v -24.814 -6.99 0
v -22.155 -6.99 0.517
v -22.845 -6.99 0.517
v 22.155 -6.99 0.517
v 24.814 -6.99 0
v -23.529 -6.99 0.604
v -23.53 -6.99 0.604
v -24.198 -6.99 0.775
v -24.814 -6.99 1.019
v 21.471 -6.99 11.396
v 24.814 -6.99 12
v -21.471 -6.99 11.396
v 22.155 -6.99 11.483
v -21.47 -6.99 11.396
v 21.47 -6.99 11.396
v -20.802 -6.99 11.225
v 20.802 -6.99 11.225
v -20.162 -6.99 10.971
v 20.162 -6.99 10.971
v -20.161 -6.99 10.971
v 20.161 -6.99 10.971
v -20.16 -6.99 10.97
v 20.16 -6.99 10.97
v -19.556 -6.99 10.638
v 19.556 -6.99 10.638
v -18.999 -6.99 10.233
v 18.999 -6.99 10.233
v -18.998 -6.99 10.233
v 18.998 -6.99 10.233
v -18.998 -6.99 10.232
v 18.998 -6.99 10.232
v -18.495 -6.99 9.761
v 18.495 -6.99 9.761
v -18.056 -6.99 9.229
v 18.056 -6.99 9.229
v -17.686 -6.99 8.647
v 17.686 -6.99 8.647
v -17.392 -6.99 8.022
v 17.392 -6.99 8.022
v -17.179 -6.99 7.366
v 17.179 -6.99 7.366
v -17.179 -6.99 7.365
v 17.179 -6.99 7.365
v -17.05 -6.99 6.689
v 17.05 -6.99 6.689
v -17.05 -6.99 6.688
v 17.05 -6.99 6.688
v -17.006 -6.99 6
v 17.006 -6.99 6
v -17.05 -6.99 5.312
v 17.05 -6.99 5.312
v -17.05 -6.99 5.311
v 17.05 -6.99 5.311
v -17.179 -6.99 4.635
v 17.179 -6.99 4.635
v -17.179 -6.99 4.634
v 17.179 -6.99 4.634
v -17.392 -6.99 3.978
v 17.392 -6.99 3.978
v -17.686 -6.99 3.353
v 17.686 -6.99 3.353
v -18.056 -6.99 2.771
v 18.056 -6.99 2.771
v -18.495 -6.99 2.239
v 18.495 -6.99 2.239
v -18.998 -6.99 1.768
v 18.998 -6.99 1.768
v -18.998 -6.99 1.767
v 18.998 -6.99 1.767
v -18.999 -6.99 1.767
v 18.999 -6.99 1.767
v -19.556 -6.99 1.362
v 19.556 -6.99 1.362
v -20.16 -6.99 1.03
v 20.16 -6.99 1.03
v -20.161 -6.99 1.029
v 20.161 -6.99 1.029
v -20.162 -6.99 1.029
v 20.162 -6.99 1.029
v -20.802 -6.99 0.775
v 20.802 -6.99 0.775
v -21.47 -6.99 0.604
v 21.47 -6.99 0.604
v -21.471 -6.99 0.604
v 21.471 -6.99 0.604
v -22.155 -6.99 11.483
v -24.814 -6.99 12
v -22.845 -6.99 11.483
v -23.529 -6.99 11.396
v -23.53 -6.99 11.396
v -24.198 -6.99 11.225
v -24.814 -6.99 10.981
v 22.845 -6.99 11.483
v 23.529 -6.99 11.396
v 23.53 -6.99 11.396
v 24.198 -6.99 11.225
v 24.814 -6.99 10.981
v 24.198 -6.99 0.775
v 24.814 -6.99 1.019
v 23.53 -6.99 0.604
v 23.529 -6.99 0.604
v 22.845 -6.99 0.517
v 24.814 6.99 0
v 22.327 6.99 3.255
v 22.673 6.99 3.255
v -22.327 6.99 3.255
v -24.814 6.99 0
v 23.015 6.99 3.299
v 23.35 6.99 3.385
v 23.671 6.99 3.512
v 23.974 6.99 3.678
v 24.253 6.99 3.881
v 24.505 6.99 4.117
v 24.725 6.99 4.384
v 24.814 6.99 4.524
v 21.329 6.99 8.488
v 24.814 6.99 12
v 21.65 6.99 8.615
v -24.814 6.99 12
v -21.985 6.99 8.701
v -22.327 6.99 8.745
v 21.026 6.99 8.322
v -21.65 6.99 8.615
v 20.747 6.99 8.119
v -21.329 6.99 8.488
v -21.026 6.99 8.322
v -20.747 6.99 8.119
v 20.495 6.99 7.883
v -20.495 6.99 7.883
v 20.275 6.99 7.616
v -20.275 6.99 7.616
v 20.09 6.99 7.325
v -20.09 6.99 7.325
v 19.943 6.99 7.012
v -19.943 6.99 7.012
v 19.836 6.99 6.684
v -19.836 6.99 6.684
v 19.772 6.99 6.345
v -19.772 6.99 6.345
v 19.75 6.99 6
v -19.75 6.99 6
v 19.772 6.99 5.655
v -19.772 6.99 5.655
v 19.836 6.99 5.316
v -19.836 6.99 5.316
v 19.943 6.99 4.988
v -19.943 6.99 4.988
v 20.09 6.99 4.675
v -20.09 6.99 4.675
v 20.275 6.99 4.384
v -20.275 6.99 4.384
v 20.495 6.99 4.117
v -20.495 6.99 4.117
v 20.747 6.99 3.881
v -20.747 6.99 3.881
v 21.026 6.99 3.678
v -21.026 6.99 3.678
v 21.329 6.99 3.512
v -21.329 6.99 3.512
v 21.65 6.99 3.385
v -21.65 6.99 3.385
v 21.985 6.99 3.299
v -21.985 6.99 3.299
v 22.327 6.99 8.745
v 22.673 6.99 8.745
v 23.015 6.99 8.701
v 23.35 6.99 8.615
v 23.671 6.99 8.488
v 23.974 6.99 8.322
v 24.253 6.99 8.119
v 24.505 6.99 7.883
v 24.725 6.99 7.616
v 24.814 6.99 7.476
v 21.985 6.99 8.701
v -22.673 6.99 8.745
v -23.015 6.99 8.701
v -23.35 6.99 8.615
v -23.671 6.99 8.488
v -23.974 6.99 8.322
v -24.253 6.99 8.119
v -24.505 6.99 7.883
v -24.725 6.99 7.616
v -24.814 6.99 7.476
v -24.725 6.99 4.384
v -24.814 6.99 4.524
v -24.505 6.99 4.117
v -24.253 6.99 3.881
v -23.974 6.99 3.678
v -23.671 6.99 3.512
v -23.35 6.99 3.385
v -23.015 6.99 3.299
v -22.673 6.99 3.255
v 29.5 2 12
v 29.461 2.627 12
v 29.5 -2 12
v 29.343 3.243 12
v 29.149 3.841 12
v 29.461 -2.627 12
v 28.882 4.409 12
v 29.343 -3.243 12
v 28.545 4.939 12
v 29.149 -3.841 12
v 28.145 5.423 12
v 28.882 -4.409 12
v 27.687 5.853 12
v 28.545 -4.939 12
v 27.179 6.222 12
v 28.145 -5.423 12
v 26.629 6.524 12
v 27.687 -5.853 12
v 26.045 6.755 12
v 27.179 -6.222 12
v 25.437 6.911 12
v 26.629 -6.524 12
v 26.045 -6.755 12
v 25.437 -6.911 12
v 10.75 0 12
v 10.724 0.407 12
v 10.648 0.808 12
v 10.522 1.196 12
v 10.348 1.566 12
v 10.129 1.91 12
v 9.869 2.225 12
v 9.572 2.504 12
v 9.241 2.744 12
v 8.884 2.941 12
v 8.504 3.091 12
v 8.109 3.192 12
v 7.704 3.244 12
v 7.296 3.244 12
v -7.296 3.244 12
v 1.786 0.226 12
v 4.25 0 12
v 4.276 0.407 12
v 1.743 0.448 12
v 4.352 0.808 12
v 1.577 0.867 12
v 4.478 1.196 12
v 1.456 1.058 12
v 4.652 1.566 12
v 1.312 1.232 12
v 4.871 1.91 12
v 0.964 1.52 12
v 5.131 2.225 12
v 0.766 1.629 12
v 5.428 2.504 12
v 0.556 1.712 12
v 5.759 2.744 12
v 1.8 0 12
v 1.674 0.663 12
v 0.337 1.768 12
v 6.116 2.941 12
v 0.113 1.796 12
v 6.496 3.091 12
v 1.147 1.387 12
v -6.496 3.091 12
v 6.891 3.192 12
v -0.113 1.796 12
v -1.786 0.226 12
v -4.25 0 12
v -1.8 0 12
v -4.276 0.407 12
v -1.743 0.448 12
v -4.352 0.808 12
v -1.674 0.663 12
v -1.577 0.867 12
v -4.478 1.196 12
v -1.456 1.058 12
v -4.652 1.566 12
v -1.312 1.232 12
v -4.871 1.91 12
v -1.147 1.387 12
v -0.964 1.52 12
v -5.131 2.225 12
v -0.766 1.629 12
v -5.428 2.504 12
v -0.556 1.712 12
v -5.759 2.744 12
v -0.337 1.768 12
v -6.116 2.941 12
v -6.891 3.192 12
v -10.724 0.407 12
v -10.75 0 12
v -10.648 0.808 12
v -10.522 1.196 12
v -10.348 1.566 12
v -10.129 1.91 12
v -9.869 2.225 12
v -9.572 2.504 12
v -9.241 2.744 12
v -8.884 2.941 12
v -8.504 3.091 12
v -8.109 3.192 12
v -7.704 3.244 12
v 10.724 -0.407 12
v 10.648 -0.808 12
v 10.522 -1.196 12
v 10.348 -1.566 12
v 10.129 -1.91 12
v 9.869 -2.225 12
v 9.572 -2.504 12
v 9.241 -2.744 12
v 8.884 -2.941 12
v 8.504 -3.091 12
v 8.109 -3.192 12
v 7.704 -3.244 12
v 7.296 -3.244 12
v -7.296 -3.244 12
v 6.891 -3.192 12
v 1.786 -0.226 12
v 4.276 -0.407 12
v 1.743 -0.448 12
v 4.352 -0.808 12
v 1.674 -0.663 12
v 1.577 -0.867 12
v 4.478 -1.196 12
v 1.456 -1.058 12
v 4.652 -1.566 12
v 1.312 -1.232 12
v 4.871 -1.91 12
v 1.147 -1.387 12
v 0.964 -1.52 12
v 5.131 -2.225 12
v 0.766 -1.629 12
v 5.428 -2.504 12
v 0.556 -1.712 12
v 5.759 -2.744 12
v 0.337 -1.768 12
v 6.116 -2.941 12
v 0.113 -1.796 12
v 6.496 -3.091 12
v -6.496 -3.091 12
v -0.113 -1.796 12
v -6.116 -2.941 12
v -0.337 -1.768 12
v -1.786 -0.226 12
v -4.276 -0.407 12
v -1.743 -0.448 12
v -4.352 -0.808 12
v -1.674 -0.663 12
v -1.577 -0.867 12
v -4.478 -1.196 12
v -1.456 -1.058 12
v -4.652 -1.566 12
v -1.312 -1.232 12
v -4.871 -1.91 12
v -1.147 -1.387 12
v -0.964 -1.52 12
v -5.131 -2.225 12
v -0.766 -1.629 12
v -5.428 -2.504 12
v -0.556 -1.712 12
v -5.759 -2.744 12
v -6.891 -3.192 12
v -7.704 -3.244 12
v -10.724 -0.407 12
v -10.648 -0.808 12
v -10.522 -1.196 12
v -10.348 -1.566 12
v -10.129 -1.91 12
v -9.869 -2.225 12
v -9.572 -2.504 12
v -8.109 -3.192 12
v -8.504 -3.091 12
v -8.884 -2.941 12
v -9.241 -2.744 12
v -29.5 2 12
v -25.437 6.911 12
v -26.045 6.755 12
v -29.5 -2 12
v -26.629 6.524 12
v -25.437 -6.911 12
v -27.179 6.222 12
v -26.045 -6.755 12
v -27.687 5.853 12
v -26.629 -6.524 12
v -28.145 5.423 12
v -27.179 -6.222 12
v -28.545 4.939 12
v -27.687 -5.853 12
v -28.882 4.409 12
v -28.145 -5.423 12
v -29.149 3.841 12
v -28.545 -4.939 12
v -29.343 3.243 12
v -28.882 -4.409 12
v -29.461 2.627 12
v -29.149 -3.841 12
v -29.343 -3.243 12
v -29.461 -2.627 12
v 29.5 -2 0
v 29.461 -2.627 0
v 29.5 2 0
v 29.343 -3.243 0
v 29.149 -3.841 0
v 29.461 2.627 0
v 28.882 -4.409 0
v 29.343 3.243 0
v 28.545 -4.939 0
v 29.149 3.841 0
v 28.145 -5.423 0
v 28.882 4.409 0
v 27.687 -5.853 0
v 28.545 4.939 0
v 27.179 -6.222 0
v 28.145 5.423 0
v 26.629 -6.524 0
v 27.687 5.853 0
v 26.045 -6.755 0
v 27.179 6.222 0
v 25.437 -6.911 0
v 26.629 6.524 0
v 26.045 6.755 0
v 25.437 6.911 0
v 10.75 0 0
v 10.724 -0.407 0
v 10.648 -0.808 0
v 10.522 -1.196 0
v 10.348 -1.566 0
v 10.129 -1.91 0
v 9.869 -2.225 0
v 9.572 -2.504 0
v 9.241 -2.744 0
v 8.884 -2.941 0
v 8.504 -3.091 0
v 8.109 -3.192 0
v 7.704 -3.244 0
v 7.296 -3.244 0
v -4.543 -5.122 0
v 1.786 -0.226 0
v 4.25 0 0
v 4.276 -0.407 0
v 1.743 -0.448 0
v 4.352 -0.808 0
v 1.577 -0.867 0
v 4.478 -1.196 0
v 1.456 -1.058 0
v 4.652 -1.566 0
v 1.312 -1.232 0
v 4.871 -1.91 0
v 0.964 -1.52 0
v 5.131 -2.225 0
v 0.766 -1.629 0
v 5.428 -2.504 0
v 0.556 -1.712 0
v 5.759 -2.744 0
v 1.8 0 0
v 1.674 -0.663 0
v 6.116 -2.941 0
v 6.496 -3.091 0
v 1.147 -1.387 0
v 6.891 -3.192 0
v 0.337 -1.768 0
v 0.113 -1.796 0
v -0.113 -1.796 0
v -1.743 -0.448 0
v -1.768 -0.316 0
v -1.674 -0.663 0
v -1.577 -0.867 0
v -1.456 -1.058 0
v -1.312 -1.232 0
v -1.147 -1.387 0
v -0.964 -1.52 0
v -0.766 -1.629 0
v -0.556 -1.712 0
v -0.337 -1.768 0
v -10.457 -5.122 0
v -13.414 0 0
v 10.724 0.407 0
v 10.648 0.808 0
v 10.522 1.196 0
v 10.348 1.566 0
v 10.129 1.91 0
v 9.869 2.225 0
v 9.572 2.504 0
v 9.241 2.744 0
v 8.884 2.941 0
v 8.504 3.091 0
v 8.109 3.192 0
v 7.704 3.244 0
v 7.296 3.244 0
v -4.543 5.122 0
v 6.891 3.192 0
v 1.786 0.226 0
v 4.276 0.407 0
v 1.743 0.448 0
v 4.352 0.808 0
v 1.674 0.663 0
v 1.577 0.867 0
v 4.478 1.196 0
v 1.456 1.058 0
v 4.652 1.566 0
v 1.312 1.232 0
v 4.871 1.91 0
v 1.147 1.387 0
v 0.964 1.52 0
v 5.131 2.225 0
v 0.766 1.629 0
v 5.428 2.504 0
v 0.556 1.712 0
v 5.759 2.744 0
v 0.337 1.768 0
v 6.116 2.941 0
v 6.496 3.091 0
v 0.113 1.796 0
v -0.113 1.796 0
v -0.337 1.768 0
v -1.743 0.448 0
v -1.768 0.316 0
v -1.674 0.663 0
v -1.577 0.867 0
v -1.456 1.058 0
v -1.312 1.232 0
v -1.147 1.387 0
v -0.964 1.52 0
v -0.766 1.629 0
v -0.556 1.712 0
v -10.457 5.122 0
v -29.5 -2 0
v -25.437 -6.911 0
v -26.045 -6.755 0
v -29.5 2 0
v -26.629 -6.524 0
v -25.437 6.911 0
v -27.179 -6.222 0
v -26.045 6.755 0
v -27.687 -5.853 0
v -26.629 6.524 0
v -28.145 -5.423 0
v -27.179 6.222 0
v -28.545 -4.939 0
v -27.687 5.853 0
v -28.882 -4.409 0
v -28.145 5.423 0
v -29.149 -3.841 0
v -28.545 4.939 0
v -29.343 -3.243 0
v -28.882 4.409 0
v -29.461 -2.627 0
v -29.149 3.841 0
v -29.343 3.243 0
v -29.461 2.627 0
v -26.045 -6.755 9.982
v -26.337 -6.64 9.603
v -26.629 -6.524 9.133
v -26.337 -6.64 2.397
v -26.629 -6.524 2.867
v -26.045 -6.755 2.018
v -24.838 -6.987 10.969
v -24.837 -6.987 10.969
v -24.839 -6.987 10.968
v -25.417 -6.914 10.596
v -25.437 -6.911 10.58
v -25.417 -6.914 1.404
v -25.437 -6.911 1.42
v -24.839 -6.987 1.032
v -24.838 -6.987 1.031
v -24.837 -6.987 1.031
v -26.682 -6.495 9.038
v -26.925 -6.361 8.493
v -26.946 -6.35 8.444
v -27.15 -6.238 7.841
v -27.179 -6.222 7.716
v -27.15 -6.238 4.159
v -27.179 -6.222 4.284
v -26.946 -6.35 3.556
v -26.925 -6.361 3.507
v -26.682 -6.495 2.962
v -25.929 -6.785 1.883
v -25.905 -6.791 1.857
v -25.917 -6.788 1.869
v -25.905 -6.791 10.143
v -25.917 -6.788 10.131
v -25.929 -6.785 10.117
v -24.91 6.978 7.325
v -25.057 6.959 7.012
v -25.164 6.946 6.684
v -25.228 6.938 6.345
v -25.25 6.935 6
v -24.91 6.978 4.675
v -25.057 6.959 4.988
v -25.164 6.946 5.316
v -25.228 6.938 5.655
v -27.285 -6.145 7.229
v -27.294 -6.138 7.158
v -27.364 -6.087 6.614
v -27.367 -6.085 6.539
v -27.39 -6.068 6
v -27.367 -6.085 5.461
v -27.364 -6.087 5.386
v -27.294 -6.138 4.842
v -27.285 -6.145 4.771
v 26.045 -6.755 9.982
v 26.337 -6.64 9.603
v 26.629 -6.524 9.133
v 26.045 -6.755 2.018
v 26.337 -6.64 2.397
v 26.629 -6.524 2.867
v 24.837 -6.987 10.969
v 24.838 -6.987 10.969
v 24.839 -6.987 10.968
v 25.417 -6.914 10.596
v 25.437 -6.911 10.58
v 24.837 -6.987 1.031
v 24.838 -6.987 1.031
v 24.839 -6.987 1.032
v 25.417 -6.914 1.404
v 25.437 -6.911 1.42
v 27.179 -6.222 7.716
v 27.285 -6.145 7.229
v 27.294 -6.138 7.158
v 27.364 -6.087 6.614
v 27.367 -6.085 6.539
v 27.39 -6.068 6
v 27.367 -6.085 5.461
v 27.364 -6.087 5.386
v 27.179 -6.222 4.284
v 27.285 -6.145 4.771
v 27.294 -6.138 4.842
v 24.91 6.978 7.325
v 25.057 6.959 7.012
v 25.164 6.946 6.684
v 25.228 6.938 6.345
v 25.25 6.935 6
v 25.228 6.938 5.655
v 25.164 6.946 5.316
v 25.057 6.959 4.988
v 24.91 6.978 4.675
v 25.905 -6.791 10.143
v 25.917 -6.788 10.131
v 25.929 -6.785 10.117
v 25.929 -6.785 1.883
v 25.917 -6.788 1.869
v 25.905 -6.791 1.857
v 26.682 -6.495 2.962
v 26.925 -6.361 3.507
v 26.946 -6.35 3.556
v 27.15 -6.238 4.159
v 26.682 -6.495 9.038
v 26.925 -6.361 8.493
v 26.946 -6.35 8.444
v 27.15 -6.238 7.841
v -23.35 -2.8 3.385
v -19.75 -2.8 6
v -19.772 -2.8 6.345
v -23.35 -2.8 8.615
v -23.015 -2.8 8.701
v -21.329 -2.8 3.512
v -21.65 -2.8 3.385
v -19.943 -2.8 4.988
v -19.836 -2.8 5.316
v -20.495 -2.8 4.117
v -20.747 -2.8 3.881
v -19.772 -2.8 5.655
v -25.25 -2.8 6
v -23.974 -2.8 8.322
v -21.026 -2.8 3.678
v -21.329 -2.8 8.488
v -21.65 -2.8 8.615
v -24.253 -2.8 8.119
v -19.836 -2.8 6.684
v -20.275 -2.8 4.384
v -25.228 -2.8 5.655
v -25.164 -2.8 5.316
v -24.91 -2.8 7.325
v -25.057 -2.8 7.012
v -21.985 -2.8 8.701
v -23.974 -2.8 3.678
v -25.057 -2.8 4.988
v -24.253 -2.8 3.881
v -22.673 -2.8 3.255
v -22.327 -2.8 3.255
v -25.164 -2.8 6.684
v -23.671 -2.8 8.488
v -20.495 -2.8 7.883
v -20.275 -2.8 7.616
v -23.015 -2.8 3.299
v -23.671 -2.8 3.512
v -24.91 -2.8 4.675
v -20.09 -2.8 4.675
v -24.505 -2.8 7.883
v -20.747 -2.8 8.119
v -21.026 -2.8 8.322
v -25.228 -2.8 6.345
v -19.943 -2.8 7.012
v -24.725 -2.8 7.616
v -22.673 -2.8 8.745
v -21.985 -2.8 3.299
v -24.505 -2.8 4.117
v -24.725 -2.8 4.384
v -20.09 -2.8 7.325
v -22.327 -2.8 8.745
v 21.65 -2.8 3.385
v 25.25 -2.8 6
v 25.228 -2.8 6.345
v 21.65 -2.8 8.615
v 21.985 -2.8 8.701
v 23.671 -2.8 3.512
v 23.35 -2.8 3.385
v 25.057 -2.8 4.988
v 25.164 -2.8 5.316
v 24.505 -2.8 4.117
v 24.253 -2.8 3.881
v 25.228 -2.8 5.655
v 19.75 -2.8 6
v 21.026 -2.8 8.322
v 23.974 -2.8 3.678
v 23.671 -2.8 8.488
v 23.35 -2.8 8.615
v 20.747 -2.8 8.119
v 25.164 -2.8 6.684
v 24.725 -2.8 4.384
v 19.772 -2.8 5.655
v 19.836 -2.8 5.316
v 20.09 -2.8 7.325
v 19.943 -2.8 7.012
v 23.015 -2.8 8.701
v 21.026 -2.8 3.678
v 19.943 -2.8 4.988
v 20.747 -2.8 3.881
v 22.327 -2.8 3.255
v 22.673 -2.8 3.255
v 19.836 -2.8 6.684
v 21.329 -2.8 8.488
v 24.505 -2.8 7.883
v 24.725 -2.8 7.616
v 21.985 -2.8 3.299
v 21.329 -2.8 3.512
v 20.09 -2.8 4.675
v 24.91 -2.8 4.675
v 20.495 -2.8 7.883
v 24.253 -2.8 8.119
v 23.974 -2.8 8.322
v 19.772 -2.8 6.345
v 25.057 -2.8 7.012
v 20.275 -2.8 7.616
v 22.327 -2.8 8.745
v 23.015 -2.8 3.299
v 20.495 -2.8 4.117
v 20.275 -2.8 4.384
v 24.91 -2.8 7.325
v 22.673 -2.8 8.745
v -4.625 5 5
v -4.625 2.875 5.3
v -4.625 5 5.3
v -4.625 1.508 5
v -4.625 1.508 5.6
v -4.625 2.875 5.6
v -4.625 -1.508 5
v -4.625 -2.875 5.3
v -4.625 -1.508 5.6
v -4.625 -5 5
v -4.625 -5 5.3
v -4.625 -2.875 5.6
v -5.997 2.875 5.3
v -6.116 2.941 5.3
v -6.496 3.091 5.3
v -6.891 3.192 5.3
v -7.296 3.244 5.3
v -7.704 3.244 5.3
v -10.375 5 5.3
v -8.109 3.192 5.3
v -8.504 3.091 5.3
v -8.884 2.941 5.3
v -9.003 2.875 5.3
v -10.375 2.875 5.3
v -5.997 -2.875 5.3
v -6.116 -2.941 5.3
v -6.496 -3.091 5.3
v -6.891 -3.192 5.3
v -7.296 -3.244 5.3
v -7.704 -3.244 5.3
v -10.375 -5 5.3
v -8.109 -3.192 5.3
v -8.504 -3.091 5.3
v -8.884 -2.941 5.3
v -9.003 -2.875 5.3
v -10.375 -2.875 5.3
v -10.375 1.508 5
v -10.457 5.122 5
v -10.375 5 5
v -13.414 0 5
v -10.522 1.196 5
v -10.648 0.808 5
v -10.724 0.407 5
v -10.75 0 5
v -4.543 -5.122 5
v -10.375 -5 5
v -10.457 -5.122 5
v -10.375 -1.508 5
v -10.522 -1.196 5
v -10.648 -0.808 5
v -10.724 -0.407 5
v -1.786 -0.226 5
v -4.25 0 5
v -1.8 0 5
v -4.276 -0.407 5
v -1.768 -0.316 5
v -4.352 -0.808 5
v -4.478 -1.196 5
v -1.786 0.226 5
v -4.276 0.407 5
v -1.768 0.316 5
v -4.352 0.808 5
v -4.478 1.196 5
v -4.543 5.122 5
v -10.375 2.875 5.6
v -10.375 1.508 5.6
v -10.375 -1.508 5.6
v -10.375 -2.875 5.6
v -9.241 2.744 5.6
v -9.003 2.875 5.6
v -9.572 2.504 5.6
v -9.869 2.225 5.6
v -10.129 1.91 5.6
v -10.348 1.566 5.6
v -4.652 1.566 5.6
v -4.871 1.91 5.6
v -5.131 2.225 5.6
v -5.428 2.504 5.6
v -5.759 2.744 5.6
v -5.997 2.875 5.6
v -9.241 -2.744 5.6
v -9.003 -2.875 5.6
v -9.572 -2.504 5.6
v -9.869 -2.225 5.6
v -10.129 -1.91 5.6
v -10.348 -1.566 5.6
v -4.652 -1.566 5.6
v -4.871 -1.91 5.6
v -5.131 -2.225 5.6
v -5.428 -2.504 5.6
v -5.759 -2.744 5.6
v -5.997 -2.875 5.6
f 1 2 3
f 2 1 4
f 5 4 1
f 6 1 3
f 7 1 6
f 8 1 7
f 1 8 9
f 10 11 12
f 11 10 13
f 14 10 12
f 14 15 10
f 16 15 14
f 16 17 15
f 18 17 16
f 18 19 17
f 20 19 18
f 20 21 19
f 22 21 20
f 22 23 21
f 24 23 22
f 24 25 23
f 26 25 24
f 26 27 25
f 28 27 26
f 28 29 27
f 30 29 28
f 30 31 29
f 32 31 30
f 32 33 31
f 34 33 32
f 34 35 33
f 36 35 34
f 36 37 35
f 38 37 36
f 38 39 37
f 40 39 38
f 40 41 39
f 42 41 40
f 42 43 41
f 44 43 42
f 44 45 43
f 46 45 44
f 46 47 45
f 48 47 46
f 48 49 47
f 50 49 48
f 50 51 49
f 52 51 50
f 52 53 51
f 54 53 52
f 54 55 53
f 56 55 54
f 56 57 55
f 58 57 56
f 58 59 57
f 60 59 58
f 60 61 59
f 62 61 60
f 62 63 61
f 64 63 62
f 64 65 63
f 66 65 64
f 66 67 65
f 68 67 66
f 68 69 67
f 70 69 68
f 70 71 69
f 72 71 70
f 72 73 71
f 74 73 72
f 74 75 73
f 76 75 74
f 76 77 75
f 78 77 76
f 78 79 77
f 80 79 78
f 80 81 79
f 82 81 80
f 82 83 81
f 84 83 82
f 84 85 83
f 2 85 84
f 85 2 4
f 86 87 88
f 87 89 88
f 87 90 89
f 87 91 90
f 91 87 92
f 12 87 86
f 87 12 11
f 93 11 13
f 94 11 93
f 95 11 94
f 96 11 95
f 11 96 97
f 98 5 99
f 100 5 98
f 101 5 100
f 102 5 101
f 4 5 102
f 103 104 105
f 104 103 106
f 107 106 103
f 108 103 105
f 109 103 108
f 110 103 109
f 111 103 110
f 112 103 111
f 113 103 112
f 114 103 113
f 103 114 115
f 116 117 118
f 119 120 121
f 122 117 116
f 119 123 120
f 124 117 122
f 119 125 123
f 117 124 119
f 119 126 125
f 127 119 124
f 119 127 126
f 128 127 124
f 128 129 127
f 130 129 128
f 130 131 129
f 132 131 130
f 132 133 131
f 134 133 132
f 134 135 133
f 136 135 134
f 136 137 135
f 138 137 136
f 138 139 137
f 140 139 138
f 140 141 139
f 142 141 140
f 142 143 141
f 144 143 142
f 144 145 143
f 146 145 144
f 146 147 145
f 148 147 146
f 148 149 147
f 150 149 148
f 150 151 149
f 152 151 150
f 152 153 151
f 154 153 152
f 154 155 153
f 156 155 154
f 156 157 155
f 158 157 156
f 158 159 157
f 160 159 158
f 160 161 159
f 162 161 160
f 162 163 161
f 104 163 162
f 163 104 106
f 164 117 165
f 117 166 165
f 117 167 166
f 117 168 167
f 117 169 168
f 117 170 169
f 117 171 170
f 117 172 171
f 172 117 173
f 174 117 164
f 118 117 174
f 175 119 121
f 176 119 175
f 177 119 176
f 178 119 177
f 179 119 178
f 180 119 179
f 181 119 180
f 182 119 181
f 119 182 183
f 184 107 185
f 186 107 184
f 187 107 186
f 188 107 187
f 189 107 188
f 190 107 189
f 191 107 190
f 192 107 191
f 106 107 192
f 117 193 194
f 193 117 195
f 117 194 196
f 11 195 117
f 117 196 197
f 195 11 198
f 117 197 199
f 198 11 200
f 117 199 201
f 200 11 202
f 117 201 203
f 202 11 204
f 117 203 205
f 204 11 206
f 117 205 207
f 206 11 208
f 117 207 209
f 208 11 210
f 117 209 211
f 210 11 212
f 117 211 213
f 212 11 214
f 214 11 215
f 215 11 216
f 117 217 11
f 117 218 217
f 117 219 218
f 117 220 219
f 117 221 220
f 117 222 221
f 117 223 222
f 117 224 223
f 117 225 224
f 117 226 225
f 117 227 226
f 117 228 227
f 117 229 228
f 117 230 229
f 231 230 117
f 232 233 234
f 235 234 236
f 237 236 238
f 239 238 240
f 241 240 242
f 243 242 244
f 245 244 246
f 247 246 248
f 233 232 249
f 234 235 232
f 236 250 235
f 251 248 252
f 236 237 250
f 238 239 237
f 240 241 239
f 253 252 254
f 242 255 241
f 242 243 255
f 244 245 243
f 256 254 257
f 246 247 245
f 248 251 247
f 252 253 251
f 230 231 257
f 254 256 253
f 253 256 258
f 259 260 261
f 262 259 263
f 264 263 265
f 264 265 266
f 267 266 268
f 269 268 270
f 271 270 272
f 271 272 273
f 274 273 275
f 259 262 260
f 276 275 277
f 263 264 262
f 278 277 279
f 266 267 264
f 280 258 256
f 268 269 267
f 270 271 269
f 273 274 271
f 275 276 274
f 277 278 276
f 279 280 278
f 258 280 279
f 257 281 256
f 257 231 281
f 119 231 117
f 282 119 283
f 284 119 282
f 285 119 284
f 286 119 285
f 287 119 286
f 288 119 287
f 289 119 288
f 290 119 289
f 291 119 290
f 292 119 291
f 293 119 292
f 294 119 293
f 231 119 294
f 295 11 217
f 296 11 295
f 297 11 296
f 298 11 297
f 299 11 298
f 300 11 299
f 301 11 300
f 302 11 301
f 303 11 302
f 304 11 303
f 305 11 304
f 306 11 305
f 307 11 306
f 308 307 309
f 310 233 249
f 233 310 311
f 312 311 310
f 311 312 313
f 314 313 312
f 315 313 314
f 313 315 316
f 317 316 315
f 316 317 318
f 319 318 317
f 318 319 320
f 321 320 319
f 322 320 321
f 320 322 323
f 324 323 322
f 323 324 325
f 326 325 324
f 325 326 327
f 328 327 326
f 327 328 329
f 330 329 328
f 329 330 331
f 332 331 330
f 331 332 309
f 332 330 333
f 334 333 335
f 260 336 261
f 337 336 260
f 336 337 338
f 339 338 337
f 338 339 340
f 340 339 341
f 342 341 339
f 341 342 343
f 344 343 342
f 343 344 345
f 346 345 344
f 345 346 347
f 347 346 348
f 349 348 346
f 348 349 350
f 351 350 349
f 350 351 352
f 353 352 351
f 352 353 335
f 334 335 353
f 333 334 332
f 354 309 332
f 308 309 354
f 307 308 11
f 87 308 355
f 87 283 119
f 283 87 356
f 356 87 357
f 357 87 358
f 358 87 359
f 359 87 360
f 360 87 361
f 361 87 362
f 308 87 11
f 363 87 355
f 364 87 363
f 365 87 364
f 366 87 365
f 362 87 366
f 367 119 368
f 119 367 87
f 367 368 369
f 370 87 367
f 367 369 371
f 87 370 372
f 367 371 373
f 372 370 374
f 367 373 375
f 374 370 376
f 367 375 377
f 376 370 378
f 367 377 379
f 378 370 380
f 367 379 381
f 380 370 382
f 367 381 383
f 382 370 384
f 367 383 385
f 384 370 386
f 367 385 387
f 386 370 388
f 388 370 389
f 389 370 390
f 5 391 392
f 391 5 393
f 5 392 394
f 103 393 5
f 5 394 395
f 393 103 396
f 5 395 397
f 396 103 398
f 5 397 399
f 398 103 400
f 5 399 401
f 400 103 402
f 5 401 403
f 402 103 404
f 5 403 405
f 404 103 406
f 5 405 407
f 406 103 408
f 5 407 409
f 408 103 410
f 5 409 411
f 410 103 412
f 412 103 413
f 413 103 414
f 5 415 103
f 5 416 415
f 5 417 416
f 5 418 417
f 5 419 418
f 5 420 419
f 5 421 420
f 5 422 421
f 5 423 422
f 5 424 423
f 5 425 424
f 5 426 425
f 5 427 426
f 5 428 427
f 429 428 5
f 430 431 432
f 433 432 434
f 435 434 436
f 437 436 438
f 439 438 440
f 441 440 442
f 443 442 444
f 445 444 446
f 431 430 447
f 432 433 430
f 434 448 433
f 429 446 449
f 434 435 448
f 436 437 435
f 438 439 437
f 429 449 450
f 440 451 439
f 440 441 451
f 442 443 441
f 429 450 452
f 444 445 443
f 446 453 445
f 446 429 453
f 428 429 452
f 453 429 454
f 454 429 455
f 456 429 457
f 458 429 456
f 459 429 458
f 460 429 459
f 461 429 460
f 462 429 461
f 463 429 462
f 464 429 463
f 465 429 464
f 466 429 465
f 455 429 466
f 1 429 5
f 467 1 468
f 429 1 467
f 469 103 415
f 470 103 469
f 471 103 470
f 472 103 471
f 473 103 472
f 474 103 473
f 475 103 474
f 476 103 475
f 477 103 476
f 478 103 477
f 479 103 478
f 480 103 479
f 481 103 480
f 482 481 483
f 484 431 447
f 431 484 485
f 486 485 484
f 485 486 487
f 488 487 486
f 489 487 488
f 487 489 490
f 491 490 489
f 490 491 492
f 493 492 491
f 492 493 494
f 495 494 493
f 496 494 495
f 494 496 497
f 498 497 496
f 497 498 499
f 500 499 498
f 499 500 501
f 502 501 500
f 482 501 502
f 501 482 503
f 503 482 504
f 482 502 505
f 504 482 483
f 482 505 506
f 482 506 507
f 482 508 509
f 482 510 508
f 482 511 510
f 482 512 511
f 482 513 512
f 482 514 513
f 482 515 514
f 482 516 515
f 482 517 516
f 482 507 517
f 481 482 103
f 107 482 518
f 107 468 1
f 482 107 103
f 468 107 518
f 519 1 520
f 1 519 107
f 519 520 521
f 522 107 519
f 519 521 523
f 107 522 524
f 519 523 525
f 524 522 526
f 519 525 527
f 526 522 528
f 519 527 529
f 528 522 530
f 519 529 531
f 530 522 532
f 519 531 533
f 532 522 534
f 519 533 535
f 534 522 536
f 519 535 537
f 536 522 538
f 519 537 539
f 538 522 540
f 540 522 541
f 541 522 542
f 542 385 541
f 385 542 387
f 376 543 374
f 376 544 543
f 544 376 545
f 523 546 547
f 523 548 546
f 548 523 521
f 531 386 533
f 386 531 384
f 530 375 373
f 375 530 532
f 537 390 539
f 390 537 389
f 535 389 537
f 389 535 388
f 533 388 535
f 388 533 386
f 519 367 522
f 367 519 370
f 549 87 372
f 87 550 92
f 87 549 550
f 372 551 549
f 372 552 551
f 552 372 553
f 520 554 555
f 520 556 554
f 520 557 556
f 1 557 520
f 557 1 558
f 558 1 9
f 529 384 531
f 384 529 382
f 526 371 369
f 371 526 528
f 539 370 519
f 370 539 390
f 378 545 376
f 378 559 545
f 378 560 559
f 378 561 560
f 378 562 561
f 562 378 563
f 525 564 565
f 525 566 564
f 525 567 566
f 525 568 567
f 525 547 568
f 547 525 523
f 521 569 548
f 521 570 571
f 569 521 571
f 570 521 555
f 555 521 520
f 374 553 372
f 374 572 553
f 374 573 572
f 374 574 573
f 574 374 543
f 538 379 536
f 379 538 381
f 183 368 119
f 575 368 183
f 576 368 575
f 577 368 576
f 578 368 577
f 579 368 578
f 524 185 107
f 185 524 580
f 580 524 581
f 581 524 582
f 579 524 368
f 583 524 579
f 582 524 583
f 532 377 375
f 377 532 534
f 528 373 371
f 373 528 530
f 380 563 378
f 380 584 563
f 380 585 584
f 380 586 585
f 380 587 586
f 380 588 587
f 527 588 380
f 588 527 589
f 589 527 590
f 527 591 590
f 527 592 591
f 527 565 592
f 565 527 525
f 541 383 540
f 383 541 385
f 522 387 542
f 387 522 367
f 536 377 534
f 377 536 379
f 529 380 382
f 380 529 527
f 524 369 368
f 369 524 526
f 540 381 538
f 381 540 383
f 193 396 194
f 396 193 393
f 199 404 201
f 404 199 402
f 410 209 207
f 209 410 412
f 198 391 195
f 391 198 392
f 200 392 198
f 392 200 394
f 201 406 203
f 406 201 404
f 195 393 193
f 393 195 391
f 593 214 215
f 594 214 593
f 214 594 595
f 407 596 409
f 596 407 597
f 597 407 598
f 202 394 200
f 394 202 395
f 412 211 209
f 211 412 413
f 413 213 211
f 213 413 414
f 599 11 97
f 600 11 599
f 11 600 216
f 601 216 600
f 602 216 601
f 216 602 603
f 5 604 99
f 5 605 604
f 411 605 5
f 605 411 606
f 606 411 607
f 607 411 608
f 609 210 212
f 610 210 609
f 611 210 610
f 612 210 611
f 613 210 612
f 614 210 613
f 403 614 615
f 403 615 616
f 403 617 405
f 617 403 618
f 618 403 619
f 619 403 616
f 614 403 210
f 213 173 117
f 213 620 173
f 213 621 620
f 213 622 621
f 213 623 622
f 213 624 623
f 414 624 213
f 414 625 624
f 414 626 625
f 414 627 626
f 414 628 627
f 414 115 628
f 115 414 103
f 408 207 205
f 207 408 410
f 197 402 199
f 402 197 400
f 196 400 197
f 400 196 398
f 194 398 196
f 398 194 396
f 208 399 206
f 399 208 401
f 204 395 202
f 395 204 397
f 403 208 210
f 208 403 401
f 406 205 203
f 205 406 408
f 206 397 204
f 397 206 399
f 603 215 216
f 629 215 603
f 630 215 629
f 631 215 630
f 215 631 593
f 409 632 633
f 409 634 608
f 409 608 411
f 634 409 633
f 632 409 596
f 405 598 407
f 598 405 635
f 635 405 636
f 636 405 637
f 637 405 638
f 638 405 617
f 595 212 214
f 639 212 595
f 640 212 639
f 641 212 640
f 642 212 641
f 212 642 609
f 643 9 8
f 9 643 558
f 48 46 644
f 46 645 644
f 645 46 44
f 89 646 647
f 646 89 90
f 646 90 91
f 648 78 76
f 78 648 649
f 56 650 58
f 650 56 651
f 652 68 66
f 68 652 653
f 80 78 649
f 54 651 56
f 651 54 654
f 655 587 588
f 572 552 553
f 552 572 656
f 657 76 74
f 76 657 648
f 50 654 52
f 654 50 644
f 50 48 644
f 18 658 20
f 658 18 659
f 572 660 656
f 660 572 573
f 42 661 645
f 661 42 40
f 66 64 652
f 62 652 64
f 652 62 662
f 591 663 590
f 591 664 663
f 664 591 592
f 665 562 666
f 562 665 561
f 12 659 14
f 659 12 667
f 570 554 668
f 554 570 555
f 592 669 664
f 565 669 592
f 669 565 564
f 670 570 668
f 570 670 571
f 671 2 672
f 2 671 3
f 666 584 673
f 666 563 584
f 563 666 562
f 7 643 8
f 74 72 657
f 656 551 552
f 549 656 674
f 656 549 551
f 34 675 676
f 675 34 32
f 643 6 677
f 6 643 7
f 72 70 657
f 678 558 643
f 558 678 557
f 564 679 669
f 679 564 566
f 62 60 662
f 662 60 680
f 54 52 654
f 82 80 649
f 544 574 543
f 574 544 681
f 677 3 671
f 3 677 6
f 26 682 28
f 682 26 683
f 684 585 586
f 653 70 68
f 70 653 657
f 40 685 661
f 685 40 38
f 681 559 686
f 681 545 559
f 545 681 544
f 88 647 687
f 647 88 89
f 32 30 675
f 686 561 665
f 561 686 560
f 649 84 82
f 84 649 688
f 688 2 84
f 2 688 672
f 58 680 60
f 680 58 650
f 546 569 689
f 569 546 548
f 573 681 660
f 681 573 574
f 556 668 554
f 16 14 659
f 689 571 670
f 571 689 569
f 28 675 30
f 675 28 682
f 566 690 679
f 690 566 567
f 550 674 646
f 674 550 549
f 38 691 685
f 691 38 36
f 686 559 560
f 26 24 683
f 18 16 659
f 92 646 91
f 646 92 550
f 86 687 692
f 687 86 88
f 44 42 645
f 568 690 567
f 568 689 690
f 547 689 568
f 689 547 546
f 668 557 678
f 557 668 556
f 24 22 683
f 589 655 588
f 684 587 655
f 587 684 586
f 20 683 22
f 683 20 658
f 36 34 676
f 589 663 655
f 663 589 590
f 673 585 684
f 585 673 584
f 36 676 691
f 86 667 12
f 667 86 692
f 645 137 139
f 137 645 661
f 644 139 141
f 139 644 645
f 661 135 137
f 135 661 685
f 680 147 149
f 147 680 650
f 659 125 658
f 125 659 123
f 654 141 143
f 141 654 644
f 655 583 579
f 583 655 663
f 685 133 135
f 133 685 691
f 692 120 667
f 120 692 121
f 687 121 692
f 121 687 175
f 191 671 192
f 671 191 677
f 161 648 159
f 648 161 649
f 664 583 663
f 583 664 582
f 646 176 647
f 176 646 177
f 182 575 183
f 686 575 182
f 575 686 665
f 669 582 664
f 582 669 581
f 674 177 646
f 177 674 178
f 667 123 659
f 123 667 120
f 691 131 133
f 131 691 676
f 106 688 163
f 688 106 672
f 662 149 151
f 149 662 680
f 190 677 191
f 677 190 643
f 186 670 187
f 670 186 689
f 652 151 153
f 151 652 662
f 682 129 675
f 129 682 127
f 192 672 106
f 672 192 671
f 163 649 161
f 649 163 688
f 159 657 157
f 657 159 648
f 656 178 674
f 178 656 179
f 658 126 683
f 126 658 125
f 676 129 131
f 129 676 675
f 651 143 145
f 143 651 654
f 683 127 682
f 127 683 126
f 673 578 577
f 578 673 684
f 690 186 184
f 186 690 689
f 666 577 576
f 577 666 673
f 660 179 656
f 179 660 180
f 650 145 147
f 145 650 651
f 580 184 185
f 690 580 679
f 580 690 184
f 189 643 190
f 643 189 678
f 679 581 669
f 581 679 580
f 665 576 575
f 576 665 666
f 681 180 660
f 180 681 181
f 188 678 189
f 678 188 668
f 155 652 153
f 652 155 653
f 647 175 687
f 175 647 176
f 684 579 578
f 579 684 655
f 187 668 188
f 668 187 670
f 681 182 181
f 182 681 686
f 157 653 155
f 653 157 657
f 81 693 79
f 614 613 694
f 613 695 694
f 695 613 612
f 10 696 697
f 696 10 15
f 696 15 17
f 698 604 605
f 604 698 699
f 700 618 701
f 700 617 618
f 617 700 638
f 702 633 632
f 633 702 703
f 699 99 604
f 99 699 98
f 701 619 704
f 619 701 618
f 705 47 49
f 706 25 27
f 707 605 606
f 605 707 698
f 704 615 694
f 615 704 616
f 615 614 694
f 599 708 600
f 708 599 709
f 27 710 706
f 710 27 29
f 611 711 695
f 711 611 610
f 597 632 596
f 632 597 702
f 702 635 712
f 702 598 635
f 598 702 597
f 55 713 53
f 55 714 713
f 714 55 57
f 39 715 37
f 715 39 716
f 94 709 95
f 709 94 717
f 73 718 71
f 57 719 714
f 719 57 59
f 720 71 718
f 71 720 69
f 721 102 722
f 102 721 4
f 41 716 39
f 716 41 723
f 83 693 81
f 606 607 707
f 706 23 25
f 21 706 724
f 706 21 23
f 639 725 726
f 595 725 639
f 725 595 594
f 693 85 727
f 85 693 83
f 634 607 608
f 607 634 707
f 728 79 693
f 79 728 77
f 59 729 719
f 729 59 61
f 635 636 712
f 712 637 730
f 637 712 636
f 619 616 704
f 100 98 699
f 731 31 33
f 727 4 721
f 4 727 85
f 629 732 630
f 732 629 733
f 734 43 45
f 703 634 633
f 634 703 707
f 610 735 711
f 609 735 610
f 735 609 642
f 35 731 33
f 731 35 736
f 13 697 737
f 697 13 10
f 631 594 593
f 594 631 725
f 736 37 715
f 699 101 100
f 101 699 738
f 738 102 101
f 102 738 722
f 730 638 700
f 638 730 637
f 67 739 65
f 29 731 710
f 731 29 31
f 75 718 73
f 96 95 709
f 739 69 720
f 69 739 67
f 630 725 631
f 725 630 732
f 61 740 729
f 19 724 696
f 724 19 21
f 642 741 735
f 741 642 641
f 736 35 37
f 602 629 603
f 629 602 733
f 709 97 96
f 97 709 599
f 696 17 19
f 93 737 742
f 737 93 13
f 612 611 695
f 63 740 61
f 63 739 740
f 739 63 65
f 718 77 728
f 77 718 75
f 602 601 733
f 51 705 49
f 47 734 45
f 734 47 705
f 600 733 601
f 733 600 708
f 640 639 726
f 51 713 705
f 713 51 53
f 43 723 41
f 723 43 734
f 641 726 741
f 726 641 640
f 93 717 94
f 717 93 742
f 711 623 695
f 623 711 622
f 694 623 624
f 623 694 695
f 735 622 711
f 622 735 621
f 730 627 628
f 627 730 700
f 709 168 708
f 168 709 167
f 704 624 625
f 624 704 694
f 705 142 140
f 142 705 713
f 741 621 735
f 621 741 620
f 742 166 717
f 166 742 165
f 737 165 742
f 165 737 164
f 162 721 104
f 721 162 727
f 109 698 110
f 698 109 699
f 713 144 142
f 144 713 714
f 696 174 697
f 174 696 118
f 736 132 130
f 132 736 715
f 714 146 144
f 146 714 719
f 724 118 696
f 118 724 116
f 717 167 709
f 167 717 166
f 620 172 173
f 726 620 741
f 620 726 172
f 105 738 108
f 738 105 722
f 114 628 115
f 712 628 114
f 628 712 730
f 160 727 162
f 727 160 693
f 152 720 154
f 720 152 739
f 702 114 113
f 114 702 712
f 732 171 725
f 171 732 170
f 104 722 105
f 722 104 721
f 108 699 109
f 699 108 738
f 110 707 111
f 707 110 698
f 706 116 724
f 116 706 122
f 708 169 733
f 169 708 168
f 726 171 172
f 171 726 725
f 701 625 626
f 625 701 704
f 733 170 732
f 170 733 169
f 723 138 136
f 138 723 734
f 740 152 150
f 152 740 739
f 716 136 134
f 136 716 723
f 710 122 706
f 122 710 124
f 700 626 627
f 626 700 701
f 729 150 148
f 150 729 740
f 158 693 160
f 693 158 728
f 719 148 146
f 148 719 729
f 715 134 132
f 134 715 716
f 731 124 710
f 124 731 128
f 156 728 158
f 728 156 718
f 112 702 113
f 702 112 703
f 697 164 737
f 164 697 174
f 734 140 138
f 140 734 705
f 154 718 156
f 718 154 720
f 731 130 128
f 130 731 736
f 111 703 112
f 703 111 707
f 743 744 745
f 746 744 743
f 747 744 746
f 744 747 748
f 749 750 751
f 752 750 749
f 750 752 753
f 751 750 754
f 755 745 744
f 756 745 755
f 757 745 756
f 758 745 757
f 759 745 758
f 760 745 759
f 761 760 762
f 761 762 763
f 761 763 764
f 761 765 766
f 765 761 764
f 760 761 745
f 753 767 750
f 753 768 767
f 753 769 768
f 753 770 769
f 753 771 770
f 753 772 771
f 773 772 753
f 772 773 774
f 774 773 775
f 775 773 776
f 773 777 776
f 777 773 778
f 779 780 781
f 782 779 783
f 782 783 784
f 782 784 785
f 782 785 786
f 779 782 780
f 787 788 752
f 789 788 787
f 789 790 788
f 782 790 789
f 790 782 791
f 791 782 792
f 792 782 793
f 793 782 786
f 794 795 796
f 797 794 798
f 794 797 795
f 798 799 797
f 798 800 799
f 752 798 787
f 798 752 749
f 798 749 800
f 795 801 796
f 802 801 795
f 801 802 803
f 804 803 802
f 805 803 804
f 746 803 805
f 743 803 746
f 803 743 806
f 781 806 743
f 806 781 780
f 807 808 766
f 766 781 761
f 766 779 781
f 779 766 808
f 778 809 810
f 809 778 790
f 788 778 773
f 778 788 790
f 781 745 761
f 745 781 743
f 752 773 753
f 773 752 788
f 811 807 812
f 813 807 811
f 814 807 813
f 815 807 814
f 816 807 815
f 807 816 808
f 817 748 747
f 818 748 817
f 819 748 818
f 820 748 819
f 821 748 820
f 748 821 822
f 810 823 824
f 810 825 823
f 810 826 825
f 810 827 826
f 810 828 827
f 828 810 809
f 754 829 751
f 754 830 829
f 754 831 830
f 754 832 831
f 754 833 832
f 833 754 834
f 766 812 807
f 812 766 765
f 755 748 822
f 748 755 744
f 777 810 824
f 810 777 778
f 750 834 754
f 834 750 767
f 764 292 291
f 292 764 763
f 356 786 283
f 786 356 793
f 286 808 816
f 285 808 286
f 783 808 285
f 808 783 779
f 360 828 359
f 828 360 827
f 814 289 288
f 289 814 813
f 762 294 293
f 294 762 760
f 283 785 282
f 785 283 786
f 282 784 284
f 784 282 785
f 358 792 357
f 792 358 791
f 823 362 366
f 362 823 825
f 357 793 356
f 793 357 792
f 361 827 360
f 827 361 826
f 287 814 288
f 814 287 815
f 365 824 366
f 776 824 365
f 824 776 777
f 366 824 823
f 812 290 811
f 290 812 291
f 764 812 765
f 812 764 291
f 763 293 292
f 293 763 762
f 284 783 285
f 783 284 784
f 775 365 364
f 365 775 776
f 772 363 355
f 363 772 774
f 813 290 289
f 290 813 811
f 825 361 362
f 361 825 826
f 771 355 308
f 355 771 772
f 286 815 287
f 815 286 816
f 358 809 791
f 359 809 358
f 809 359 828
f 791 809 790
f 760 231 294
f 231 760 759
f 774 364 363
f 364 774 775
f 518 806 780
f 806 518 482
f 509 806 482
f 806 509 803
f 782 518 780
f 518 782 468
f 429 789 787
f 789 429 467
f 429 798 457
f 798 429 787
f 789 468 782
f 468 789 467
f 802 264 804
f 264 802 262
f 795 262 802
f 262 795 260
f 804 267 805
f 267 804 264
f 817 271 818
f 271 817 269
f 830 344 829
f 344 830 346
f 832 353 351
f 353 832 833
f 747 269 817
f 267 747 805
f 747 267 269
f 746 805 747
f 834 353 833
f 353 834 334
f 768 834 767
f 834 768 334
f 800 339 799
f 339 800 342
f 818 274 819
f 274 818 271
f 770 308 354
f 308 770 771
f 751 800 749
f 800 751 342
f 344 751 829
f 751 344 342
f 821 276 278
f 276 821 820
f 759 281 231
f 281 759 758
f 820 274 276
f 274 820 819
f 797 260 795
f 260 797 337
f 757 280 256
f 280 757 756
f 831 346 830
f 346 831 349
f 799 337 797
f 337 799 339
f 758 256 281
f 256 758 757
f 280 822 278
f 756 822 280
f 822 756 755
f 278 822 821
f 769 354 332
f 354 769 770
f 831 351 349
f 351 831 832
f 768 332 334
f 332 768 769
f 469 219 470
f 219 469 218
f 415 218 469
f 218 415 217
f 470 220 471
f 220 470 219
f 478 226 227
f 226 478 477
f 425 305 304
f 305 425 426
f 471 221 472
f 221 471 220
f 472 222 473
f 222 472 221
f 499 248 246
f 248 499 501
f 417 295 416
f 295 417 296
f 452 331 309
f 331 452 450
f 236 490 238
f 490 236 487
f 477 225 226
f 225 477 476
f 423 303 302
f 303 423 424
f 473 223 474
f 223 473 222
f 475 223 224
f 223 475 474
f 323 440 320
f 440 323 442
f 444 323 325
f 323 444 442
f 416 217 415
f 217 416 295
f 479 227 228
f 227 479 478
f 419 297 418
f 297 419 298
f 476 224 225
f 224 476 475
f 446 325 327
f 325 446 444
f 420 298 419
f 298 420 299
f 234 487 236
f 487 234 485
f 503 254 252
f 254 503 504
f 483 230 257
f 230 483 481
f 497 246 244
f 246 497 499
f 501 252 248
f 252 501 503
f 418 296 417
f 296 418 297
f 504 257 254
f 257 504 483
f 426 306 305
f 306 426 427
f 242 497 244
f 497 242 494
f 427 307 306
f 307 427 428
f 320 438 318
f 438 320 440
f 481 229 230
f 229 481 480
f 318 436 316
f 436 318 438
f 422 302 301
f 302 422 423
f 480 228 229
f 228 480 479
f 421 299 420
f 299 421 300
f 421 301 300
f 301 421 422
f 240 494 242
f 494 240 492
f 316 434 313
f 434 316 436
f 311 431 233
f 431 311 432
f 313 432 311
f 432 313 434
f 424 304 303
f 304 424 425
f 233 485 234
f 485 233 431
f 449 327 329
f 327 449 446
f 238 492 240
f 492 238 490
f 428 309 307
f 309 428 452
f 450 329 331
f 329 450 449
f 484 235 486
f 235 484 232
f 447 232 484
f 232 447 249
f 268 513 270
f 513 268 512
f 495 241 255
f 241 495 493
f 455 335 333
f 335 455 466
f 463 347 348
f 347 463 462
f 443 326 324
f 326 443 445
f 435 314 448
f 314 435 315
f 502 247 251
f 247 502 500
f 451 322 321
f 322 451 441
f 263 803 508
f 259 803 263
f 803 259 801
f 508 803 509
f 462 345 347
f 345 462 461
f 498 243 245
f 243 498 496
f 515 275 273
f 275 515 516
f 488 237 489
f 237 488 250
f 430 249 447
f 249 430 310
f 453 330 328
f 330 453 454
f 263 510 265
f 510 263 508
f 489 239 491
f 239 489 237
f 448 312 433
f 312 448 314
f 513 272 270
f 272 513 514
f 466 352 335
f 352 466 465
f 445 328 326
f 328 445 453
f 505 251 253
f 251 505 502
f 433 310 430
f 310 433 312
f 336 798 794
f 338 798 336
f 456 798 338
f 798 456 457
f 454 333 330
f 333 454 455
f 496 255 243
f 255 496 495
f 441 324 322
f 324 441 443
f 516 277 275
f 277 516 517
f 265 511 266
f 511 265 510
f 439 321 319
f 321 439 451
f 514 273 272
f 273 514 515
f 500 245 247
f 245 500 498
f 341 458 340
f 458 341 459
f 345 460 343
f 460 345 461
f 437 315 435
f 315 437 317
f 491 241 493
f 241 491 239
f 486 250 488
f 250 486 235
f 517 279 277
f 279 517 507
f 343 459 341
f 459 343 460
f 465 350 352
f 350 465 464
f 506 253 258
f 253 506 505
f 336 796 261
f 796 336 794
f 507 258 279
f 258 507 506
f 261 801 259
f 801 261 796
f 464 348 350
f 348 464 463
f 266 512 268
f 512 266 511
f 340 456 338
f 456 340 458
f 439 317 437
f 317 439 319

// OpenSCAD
$fn = 50;


difference() {
	union() {
		hull() {
			translate(v = [-9.5000000000, 2.0000000000, 0]) {
				cylinder(h = 12, r = 5);
			}
			translate(v = [9.5000000000, 2.0000000000, 0]) {
				cylinder(h = 12, r = 5);
			}
			translate(v = [-9.5000000000, -2.0000000000, 0]) {
				cylinder(h = 12, r = 5);
			}
			translate(v = [9.5000000000, -2.0000000000, 0]) {
				cylinder(h = 12, r = 5);
			}
		}
		translate(v = [-15.0000000000, 0.0000000000, 0]) {
			hull() {
				translate(v = [-9.5000000000, 2.0000000000, 0]) {
					cylinder(h = 12, r = 5);
				}
				translate(v = [9.5000000000, 2.0000000000, 0]) {
					cylinder(h = 12, r = 5);
				}
				translate(v = [-9.5000000000, -2.0000000000, 0]) {
					cylinder(h = 12, r = 5);
				}
				translate(v = [9.5000000000, -2.0000000000, 0]) {
					cylinder(h = 12, r = 5);
				}
			}
		}
		translate(v = [-15.0000000000, 0.0000000000, 0]) {
			hull() {
				translate(v = [-9.5000000000, 2.0000000000, 0]) {
					cylinder(h = 12, r = 5);
				}
				translate(v = [9.5000000000, 2.0000000000, 0]) {
					cylinder(h = 12, r = 5);
				}
				translate(v = [-9.5000000000, -2.0000000000, 0]) {
					cylinder(h = 12, r = 5);
				}
				translate(v = [9.5000000000, -2.0000000000, 0]) {
					cylinder(h = 12, r = 5);
				}
			}
		}
		translate(v = [15.0000000000, 0.0000000000, 0]) {
			hull() {
				translate(v = [-9.5000000000, 2.0000000000, 0]) {
					cylinder(h = 12, r = 5);
				}
				translate(v = [9.5000000000, 2.0000000000, 0]) {
					cylinder(h = 12, r = 5);
				}
				translate(v = [-9.5000000000, -2.0000000000, 0]) {
					cylinder(h = 12, r = 5);
				}
				translate(v = [9.5000000000, -2.0000000000, 0]) {
					cylinder(h = 12, r = 5);
				}
			}
		}
		translate(v = [15.0000000000, 0.0000000000, 0]) {
			hull() {
				translate(v = [-9.5000000000, 2.0000000000, 0]) {
					cylinder(h = 12, r = 5);
				}
				translate(v = [9.5000000000, 2.0000000000, 0]) {
					cylinder(h = 12, r = 5);
				}
				translate(v = [-9.5000000000, -2.0000000000, 0]) {
					cylinder(h = 12, r = 5);
				}
				translate(v = [9.5000000000, -2.0000000000, 0]) {
					cylinder(h = 12, r = 5);
				}
			}
		}
	}
	union() {
		translate(v = [-22.5000000000, -7.0000000000, 6.0000000000]) {
			rotate(a = [90, 0, 0]) {
				difference() {
					union() {
						#translate(v = [0, 0, -14.0000000000]) {
							cylinder(h = 14, r = 2.2500000000);
						}
						#translate(v = [0, 0, -4.2000000000]) {
							cylinder(h = 4.2000000000, r1 = 2.7500000000, r2 = 5.5000000000);
						}
						#translate(v = [0, 0, -14.0000000000]) {
							cylinder(h = 14, r = 2.7500000000);
						}
						#translate(v = [0, 0, -14.0000000000]) {
							cylinder(h = 14, r = 2.2500000000);
						}
					}
					union();
				}
			}
		}
		translate(v = [22.5000000000, -7.0000000000, 6.0000000000]) {
			rotate(a = [90, 0, 0]) {
				difference() {
					union() {
						#translate(v = [0, 0, -14.0000000000]) {
							cylinder(h = 14, r = 2.2500000000);
						}
						#translate(v = [0, 0, -4.2000000000]) {
							cylinder(h = 4.2000000000, r1 = 2.7500000000, r2 = 5.5000000000);
						}
						#translate(v = [0, 0, -14.0000000000]) {
							cylinder(h = 14, r = 2.7500000000);
						}
						#translate(v = [0, 0, -14.0000000000]) {
							cylinder(h = 14, r = 2.2500000000);
						}
					}
					union();
				}
			}
		}
		translate(v = [-7.5000000000, 0.0000000000, 0]) {
			rotate(a = [0, 0, 0]) {
				difference() {
					union() {
						#translate(v = [-2.8750000000, -5.0000000000, -0.3000000000]) {
							cube(size = [5.7500000000, 10, 0.3000000000]);
						}
						#translate(v = [-2.8750000000, -2.8750000000, -0.6000000000]) {
							cube(size = [5.7500000000, 5.7500000000, 0.3000000000]);
						}
						#translate(v = [-2.8750000000, -5.0000000000, 5]) {
							cube(size = [5.7500000000, 10, 0.3000000000]);
						}
						#translate(v = [-2.8750000000, -2.8750000000, 5.3000000000]) {
							cube(size = [5.7500000000, 5.7500000000, 0.3000000000]);
						}
						#translate(v = [0, 0, -100.0000000000]) {
							cylinder(h = 200, r = 3.2500000000);
						}
						#linear_extrude(height = 5) {
							polygon(points = [[5.9142500000, 0.0000000000], [2.9571250000, 5.1218907443], [-2.9571250000, 5.1218907443], [-5.9142500000, 0.0000000000], [-2.9571250000, -5.1218907443], [2.9571250000, -5.1218907443]]);
						}
						#translate(v = [-2.8750000000, -5.0000000000, -0.3000000000]) {
							cube(size = [5.7500000000, 10, 0.3000000000]);
						}
						#translate(v = [-2.8750000000, -2.8750000000, -0.6000000000]) {
							cube(size = [5.7500000000, 5.7500000000, 0.3000000000]);
						}
						#translate(v = [-2.8750000000, -5.0000000000, 5]) {
							cube(size = [5.7500000000, 10, 0.3000000000]);
						}
						#translate(v = [-2.8750000000, -2.8750000000, 5.3000000000]) {
							cube(size = [5.7500000000, 5.7500000000, 0.3000000000]);
						}
						#translate(v = [0, 0, -100.0000000000]) {
							cylinder(h = 200, r = 3.2500000000);
						}
						#translate(v = [-2.8750000000, -5.0000000000, -0.3000000000]) {
							cube(size = [5.7500000000, 10, 0.3000000000]);
						}
						#translate(v = [-2.8750000000, -2.8750000000, -0.6000000000]) {
							cube(size = [5.7500000000, 5.7500000000, 0.3000000000]);
						}
						#translate(v = [-2.8750000000, -5.0000000000, 5]) {
							cube(size = [5.7500000000, 10, 0.3000000000]);
						}
						#translate(v = [-2.8750000000, -2.8750000000, 5.3000000000]) {
							cube(size = [5.7500000000, 5.7500000000, 0.3000000000]);
						}
						#translate(v = [0, 0, -100.0000000000]) {
							cylinder(h = 200, r = 3.2500000000);
						}
					}
					union();
				}
			}
		}
		translate(v = [-7.5000000000, 0.0000000000, 0]) {
			translate(v = [0, 0, -100]) {
				cylinder(h = 200, r = 3.2500000000);
			}
		}
		translate(v = [7.5000000000, 0.0000000000, 0]) {
			translate(v = [0, 0, -100]) {
				cylinder(h = 200, r = 3.2500000000);
			}
		}
		translate(v = [-7.5000000000, 0.0000000000, 0]) {
			translate(v = [0, 0, -100]) {
				cylinder(h = 200, r = 1.8000000000);
			}
		}
		translate(v = [0, 0, -100]) {
			cylinder(h = 200, r = 1.8000000000);
		}
		translate(v = [7.5000000000, 0.0000000000, 0]) {
			translate(v = [0, 0, -100]) {
				cylinder(h = 200, r = 1.8000000000);
			}
		}
	}
}
